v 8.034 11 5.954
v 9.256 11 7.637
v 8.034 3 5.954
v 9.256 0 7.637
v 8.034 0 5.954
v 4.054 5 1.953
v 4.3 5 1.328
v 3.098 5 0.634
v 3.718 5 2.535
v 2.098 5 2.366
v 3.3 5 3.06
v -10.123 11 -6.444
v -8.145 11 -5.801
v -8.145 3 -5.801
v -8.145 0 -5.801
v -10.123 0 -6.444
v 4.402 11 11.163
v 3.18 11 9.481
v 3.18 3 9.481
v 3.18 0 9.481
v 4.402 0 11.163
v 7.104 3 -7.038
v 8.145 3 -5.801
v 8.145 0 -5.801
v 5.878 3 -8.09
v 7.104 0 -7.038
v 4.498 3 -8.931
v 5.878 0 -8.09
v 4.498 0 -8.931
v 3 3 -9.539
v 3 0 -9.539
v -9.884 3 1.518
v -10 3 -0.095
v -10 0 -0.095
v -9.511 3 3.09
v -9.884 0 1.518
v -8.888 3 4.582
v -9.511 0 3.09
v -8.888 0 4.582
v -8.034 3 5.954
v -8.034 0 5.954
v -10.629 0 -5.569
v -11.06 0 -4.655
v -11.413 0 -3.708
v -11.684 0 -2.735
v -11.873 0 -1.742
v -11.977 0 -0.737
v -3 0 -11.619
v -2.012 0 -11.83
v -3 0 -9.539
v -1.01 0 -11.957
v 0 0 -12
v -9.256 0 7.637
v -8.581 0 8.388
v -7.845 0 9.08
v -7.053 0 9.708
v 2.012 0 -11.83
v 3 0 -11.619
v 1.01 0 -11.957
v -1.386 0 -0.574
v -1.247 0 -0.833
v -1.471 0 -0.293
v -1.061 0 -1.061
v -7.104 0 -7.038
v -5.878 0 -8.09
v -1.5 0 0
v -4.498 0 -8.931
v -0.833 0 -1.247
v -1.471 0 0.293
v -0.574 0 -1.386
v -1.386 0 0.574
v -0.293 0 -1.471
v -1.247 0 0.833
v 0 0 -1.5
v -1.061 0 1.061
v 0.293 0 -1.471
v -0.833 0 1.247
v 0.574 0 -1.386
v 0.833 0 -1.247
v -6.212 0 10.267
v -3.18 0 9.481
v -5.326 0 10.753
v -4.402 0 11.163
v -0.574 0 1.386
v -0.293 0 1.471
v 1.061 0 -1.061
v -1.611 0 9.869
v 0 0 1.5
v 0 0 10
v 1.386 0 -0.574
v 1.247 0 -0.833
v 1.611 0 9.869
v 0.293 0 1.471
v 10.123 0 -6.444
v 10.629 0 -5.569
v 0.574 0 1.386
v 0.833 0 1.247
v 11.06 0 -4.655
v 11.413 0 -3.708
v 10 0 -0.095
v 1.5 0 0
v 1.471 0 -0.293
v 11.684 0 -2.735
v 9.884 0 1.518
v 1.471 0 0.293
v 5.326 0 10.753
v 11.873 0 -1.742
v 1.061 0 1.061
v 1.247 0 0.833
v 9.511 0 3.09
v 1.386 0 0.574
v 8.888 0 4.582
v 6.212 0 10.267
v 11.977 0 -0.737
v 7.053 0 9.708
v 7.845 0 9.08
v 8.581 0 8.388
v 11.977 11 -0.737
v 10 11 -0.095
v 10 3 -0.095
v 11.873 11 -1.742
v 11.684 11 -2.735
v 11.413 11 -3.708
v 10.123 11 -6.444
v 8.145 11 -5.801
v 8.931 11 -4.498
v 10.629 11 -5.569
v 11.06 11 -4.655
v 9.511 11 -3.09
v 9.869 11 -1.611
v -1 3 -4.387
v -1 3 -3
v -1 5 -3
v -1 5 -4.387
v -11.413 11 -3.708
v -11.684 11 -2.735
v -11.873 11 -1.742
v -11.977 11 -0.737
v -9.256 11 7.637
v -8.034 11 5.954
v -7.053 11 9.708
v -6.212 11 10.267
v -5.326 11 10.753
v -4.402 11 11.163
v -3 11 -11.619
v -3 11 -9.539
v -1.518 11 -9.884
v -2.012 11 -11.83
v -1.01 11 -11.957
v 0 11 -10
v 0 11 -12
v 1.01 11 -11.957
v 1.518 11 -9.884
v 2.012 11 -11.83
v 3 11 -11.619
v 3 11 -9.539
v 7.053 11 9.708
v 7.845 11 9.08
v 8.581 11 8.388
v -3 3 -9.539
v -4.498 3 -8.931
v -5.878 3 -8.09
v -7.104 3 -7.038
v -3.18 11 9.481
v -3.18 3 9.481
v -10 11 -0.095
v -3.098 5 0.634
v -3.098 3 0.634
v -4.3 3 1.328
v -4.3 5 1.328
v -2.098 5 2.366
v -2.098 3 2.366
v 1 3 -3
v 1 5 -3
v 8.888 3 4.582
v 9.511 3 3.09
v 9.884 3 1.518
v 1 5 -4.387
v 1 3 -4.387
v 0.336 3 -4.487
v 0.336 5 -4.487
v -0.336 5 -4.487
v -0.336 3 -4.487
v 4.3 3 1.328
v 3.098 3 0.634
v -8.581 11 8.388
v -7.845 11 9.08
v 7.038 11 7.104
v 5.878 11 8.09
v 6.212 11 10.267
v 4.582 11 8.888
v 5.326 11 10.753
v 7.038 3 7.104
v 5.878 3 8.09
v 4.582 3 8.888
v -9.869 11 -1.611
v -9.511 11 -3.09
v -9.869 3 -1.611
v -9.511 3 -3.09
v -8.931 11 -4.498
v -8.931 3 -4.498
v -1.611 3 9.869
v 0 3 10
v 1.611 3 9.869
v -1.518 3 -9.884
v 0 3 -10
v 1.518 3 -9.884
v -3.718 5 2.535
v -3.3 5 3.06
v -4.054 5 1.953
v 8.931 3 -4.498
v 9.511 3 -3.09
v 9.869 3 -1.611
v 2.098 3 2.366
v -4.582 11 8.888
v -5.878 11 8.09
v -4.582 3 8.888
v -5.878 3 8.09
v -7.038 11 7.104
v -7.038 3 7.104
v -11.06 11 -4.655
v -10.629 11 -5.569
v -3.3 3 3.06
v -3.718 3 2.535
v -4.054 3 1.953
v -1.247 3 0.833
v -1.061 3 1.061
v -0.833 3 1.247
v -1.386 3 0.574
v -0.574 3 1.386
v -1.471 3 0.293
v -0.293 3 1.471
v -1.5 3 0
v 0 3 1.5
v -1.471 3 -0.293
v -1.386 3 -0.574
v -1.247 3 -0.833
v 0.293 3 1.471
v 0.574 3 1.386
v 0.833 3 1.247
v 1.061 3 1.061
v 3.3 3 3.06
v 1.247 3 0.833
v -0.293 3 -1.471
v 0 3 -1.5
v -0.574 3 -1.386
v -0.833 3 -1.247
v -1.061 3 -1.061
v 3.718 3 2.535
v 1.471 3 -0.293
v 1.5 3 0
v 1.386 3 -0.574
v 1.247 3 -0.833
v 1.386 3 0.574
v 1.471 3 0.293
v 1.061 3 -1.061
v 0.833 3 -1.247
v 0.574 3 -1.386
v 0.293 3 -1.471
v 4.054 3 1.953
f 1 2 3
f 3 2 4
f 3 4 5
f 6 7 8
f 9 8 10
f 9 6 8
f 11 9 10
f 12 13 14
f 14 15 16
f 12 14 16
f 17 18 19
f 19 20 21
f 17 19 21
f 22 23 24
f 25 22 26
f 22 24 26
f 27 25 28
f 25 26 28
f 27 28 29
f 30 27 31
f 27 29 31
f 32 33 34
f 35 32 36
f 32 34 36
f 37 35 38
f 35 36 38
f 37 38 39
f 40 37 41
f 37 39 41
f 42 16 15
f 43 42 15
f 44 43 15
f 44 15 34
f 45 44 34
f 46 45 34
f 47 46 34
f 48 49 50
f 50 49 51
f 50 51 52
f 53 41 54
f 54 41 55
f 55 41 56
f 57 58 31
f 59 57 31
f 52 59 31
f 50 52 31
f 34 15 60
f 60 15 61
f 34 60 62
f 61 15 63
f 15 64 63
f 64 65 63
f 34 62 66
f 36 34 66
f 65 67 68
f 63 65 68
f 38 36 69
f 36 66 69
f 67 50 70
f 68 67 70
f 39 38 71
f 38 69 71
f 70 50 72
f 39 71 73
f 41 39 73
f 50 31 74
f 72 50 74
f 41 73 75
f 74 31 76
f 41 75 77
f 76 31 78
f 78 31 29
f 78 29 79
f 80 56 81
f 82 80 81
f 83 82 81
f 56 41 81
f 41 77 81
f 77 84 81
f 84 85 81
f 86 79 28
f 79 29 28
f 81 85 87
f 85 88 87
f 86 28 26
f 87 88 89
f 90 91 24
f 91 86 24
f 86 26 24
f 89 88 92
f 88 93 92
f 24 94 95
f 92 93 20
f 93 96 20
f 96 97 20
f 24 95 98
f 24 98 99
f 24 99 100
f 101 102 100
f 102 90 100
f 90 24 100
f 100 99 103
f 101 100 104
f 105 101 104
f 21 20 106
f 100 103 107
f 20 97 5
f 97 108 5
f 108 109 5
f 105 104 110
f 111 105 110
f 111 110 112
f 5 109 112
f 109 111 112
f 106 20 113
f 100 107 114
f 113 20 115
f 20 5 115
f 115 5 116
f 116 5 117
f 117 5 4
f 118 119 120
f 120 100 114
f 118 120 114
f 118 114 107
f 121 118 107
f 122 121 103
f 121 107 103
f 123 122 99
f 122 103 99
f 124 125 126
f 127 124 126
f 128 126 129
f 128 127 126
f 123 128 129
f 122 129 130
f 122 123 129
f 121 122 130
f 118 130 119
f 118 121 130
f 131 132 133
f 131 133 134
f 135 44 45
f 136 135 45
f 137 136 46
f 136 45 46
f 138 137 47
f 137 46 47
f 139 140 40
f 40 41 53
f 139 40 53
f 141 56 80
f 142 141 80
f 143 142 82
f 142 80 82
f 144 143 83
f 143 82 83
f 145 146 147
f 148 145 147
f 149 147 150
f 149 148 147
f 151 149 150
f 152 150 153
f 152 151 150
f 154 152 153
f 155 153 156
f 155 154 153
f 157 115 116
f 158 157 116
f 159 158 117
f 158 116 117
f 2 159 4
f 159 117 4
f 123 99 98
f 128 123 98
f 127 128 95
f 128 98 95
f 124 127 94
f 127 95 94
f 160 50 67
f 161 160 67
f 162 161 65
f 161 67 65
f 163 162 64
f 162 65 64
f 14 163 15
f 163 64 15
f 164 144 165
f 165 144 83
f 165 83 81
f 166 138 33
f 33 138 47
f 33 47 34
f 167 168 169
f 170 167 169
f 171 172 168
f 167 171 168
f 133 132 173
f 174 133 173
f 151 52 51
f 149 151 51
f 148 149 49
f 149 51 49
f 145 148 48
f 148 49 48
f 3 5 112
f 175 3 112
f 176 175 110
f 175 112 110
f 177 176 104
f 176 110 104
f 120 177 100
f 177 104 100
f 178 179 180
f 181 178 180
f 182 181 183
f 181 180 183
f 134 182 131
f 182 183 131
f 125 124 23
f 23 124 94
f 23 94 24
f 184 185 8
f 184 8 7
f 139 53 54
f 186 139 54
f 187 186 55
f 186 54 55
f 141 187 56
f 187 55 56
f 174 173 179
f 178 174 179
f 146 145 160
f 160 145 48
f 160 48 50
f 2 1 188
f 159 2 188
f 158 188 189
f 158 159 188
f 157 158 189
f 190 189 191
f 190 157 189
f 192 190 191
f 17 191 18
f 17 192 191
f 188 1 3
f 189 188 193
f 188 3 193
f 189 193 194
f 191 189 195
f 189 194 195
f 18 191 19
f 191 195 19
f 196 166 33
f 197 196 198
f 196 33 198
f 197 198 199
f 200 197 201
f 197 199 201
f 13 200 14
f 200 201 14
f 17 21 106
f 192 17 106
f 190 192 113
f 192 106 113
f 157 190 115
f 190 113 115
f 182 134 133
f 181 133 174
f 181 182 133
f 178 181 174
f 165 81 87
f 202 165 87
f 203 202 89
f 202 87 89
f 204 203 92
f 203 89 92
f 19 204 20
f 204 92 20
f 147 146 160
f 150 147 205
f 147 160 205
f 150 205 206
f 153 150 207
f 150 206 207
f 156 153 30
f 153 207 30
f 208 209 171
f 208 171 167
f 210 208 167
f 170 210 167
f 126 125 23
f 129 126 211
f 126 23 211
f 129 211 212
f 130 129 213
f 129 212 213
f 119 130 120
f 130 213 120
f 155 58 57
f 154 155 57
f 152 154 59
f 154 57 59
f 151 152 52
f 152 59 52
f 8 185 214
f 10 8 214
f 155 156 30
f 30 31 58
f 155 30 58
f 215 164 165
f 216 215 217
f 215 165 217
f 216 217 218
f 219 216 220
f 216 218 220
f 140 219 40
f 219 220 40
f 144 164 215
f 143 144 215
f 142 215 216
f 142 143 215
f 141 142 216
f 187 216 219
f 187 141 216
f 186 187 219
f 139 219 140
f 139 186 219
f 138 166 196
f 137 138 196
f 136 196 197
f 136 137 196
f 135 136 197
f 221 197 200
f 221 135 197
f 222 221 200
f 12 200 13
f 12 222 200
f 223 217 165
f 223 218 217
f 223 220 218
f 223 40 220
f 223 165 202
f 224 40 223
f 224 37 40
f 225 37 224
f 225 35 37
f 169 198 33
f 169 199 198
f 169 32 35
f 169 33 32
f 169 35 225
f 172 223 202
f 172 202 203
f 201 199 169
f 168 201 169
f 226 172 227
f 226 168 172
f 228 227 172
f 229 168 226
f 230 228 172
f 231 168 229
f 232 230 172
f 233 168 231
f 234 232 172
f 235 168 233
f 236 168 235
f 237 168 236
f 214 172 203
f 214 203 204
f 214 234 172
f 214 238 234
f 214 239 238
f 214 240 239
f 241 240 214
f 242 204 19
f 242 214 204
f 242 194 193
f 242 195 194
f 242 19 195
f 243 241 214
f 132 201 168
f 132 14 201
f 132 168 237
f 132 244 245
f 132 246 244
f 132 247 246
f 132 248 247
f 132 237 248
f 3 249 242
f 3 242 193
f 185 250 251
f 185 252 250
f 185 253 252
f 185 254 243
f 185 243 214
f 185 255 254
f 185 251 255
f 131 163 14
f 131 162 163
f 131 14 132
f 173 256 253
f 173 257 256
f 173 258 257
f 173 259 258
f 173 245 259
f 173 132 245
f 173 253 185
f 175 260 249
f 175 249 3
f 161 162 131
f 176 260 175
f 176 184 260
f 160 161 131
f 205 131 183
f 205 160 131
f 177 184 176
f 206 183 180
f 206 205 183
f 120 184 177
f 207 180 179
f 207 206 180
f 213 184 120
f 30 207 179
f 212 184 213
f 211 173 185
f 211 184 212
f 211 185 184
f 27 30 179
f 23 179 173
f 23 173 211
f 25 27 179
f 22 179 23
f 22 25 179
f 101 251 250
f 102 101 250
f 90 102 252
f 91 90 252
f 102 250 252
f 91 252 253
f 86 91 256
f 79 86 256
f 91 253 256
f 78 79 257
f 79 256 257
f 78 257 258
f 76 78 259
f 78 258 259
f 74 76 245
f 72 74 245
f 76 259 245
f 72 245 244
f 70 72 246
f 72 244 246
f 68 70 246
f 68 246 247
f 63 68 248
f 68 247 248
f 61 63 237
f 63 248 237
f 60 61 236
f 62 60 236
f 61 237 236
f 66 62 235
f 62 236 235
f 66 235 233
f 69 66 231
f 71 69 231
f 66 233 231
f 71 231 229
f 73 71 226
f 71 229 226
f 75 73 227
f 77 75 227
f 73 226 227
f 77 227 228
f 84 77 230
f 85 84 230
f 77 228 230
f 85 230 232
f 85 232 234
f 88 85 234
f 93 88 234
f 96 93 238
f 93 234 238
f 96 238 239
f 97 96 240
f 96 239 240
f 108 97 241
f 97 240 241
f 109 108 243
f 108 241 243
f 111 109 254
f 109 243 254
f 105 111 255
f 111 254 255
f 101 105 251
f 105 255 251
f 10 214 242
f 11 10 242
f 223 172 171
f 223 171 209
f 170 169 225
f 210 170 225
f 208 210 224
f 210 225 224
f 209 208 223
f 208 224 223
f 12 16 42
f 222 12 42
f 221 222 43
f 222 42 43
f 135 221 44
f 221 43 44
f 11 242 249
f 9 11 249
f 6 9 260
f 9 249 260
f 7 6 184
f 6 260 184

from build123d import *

# Parameters (mm, degrees)
SKETCH1_R           = 10
BOSS_EXTRUDE1_DEPTH = 3
SKETCH2_W           = 2
SKETCH2_H           = 3
BOSS_EXTRUDE2_DEPTH = 2
CIRPATTERN1_COUNT   = 3
SKETCH3_R           = 9
SKETCH3_R_2         = 4.5
CUT_EXTRUDE1_DEPTH  = 2
SKETCH4_R           = 1.5
CUT_EXTRUDE2_DEPTH  = 3
BOSS_EXTRUDE3_START = -3
BOSS_EXTRUDE3_DEPTH = 11
CIRPATTERN2_COUNT   = 5


with BuildPart() as part:
    # Sketch1 → Boss-Extrude1 (new body)
    with BuildSketch(Plane(origin=(0, 0, 0), x_dir=(1, 0, 0), z_dir=(0, 1, 0))):
        Circle(SKETCH1_R)
    extrude(amount=BOSS_EXTRUDE1_DEPTH)

    # Sketch2 → Boss-Extrude2 (add)
    with BuildSketch(Plane(origin=(0, 3, 0), x_dir=(1, 0, 0), z_dir=(0, 1, 0))):
        with Locations((0, 4.5)):
            Rectangle(SKETCH2_W, SKETCH2_H)
    boss_extrude2 = extrude(amount=BOSS_EXTRUDE2_DEPTH)

    # CirPattern1: Boss-Extrude2 ×3 about axis
    cirpattern1_axis = Axis((0, 0, 0), (0, 1, 0))
    for i in range(1, CIRPATTERN1_COUNT):
        add(boss_extrude2.rotate(cirpattern1_axis, i * 360 / CIRPATTERN1_COUNT))

    # Sketch3 → Cut-Extrude1 (cut)
    with BuildSketch(Plane(origin=(0, 3, 0), x_dir=(1, 0, 0), z_dir=(0, 1, 0))):
        Circle(SKETCH3_R)
        Circle(SKETCH3_R_2, mode=Mode.SUBTRACT)
    extrude(amount=CUT_EXTRUDE1_DEPTH, mode=Mode.SUBTRACT)

    # Sketch4 → Cut-Extrude2 (cut)
    with BuildSketch(Plane(origin=(0, 3, 0), x_dir=(1, 0, 0), z_dir=(0, 1, 0))):
        Circle(SKETCH4_R)
    extrude(amount=-CUT_EXTRUDE2_DEPTH, mode=Mode.SUBTRACT)

    # Sketch5 → Boss-Extrude3 (add)
    with BuildSketch(Plane(origin=(0, 3, 0), x_dir=(1, 0, 0), z_dir=(0, 1, 0)).offset(BOSS_EXTRUDE3_START)):
        with BuildLine():
            ThreePointArc((3, 11.618950039), (1.51205151, 11.904356355), (0, 12))
            ThreePointArc((0, 12), (-1.51205151, 11.904356355), (-3, 11.618950039))
            Line((-3, 11.618950039), (-3, 9.539392014))
            ThreePointArc((-3, 9.539392014), (0, 10), (3, 9.539392014))
            Line((3, 9.539392014), (3, 11.618950039))
        make_face()
    boss_extrude3 = extrude(amount=BOSS_EXTRUDE3_DEPTH)

    # CirPattern2: Boss-Extrude3 ×5 about axis
    cirpattern2_axis = Axis((0, 0, 0), (0, 1, 0))
    for i in range(1, CIRPATTERN2_COUNT):
        add(boss_extrude3.rotate(cirpattern2_axis, i * 360 / CIRPATTERN2_COUNT))


solid = part.part
